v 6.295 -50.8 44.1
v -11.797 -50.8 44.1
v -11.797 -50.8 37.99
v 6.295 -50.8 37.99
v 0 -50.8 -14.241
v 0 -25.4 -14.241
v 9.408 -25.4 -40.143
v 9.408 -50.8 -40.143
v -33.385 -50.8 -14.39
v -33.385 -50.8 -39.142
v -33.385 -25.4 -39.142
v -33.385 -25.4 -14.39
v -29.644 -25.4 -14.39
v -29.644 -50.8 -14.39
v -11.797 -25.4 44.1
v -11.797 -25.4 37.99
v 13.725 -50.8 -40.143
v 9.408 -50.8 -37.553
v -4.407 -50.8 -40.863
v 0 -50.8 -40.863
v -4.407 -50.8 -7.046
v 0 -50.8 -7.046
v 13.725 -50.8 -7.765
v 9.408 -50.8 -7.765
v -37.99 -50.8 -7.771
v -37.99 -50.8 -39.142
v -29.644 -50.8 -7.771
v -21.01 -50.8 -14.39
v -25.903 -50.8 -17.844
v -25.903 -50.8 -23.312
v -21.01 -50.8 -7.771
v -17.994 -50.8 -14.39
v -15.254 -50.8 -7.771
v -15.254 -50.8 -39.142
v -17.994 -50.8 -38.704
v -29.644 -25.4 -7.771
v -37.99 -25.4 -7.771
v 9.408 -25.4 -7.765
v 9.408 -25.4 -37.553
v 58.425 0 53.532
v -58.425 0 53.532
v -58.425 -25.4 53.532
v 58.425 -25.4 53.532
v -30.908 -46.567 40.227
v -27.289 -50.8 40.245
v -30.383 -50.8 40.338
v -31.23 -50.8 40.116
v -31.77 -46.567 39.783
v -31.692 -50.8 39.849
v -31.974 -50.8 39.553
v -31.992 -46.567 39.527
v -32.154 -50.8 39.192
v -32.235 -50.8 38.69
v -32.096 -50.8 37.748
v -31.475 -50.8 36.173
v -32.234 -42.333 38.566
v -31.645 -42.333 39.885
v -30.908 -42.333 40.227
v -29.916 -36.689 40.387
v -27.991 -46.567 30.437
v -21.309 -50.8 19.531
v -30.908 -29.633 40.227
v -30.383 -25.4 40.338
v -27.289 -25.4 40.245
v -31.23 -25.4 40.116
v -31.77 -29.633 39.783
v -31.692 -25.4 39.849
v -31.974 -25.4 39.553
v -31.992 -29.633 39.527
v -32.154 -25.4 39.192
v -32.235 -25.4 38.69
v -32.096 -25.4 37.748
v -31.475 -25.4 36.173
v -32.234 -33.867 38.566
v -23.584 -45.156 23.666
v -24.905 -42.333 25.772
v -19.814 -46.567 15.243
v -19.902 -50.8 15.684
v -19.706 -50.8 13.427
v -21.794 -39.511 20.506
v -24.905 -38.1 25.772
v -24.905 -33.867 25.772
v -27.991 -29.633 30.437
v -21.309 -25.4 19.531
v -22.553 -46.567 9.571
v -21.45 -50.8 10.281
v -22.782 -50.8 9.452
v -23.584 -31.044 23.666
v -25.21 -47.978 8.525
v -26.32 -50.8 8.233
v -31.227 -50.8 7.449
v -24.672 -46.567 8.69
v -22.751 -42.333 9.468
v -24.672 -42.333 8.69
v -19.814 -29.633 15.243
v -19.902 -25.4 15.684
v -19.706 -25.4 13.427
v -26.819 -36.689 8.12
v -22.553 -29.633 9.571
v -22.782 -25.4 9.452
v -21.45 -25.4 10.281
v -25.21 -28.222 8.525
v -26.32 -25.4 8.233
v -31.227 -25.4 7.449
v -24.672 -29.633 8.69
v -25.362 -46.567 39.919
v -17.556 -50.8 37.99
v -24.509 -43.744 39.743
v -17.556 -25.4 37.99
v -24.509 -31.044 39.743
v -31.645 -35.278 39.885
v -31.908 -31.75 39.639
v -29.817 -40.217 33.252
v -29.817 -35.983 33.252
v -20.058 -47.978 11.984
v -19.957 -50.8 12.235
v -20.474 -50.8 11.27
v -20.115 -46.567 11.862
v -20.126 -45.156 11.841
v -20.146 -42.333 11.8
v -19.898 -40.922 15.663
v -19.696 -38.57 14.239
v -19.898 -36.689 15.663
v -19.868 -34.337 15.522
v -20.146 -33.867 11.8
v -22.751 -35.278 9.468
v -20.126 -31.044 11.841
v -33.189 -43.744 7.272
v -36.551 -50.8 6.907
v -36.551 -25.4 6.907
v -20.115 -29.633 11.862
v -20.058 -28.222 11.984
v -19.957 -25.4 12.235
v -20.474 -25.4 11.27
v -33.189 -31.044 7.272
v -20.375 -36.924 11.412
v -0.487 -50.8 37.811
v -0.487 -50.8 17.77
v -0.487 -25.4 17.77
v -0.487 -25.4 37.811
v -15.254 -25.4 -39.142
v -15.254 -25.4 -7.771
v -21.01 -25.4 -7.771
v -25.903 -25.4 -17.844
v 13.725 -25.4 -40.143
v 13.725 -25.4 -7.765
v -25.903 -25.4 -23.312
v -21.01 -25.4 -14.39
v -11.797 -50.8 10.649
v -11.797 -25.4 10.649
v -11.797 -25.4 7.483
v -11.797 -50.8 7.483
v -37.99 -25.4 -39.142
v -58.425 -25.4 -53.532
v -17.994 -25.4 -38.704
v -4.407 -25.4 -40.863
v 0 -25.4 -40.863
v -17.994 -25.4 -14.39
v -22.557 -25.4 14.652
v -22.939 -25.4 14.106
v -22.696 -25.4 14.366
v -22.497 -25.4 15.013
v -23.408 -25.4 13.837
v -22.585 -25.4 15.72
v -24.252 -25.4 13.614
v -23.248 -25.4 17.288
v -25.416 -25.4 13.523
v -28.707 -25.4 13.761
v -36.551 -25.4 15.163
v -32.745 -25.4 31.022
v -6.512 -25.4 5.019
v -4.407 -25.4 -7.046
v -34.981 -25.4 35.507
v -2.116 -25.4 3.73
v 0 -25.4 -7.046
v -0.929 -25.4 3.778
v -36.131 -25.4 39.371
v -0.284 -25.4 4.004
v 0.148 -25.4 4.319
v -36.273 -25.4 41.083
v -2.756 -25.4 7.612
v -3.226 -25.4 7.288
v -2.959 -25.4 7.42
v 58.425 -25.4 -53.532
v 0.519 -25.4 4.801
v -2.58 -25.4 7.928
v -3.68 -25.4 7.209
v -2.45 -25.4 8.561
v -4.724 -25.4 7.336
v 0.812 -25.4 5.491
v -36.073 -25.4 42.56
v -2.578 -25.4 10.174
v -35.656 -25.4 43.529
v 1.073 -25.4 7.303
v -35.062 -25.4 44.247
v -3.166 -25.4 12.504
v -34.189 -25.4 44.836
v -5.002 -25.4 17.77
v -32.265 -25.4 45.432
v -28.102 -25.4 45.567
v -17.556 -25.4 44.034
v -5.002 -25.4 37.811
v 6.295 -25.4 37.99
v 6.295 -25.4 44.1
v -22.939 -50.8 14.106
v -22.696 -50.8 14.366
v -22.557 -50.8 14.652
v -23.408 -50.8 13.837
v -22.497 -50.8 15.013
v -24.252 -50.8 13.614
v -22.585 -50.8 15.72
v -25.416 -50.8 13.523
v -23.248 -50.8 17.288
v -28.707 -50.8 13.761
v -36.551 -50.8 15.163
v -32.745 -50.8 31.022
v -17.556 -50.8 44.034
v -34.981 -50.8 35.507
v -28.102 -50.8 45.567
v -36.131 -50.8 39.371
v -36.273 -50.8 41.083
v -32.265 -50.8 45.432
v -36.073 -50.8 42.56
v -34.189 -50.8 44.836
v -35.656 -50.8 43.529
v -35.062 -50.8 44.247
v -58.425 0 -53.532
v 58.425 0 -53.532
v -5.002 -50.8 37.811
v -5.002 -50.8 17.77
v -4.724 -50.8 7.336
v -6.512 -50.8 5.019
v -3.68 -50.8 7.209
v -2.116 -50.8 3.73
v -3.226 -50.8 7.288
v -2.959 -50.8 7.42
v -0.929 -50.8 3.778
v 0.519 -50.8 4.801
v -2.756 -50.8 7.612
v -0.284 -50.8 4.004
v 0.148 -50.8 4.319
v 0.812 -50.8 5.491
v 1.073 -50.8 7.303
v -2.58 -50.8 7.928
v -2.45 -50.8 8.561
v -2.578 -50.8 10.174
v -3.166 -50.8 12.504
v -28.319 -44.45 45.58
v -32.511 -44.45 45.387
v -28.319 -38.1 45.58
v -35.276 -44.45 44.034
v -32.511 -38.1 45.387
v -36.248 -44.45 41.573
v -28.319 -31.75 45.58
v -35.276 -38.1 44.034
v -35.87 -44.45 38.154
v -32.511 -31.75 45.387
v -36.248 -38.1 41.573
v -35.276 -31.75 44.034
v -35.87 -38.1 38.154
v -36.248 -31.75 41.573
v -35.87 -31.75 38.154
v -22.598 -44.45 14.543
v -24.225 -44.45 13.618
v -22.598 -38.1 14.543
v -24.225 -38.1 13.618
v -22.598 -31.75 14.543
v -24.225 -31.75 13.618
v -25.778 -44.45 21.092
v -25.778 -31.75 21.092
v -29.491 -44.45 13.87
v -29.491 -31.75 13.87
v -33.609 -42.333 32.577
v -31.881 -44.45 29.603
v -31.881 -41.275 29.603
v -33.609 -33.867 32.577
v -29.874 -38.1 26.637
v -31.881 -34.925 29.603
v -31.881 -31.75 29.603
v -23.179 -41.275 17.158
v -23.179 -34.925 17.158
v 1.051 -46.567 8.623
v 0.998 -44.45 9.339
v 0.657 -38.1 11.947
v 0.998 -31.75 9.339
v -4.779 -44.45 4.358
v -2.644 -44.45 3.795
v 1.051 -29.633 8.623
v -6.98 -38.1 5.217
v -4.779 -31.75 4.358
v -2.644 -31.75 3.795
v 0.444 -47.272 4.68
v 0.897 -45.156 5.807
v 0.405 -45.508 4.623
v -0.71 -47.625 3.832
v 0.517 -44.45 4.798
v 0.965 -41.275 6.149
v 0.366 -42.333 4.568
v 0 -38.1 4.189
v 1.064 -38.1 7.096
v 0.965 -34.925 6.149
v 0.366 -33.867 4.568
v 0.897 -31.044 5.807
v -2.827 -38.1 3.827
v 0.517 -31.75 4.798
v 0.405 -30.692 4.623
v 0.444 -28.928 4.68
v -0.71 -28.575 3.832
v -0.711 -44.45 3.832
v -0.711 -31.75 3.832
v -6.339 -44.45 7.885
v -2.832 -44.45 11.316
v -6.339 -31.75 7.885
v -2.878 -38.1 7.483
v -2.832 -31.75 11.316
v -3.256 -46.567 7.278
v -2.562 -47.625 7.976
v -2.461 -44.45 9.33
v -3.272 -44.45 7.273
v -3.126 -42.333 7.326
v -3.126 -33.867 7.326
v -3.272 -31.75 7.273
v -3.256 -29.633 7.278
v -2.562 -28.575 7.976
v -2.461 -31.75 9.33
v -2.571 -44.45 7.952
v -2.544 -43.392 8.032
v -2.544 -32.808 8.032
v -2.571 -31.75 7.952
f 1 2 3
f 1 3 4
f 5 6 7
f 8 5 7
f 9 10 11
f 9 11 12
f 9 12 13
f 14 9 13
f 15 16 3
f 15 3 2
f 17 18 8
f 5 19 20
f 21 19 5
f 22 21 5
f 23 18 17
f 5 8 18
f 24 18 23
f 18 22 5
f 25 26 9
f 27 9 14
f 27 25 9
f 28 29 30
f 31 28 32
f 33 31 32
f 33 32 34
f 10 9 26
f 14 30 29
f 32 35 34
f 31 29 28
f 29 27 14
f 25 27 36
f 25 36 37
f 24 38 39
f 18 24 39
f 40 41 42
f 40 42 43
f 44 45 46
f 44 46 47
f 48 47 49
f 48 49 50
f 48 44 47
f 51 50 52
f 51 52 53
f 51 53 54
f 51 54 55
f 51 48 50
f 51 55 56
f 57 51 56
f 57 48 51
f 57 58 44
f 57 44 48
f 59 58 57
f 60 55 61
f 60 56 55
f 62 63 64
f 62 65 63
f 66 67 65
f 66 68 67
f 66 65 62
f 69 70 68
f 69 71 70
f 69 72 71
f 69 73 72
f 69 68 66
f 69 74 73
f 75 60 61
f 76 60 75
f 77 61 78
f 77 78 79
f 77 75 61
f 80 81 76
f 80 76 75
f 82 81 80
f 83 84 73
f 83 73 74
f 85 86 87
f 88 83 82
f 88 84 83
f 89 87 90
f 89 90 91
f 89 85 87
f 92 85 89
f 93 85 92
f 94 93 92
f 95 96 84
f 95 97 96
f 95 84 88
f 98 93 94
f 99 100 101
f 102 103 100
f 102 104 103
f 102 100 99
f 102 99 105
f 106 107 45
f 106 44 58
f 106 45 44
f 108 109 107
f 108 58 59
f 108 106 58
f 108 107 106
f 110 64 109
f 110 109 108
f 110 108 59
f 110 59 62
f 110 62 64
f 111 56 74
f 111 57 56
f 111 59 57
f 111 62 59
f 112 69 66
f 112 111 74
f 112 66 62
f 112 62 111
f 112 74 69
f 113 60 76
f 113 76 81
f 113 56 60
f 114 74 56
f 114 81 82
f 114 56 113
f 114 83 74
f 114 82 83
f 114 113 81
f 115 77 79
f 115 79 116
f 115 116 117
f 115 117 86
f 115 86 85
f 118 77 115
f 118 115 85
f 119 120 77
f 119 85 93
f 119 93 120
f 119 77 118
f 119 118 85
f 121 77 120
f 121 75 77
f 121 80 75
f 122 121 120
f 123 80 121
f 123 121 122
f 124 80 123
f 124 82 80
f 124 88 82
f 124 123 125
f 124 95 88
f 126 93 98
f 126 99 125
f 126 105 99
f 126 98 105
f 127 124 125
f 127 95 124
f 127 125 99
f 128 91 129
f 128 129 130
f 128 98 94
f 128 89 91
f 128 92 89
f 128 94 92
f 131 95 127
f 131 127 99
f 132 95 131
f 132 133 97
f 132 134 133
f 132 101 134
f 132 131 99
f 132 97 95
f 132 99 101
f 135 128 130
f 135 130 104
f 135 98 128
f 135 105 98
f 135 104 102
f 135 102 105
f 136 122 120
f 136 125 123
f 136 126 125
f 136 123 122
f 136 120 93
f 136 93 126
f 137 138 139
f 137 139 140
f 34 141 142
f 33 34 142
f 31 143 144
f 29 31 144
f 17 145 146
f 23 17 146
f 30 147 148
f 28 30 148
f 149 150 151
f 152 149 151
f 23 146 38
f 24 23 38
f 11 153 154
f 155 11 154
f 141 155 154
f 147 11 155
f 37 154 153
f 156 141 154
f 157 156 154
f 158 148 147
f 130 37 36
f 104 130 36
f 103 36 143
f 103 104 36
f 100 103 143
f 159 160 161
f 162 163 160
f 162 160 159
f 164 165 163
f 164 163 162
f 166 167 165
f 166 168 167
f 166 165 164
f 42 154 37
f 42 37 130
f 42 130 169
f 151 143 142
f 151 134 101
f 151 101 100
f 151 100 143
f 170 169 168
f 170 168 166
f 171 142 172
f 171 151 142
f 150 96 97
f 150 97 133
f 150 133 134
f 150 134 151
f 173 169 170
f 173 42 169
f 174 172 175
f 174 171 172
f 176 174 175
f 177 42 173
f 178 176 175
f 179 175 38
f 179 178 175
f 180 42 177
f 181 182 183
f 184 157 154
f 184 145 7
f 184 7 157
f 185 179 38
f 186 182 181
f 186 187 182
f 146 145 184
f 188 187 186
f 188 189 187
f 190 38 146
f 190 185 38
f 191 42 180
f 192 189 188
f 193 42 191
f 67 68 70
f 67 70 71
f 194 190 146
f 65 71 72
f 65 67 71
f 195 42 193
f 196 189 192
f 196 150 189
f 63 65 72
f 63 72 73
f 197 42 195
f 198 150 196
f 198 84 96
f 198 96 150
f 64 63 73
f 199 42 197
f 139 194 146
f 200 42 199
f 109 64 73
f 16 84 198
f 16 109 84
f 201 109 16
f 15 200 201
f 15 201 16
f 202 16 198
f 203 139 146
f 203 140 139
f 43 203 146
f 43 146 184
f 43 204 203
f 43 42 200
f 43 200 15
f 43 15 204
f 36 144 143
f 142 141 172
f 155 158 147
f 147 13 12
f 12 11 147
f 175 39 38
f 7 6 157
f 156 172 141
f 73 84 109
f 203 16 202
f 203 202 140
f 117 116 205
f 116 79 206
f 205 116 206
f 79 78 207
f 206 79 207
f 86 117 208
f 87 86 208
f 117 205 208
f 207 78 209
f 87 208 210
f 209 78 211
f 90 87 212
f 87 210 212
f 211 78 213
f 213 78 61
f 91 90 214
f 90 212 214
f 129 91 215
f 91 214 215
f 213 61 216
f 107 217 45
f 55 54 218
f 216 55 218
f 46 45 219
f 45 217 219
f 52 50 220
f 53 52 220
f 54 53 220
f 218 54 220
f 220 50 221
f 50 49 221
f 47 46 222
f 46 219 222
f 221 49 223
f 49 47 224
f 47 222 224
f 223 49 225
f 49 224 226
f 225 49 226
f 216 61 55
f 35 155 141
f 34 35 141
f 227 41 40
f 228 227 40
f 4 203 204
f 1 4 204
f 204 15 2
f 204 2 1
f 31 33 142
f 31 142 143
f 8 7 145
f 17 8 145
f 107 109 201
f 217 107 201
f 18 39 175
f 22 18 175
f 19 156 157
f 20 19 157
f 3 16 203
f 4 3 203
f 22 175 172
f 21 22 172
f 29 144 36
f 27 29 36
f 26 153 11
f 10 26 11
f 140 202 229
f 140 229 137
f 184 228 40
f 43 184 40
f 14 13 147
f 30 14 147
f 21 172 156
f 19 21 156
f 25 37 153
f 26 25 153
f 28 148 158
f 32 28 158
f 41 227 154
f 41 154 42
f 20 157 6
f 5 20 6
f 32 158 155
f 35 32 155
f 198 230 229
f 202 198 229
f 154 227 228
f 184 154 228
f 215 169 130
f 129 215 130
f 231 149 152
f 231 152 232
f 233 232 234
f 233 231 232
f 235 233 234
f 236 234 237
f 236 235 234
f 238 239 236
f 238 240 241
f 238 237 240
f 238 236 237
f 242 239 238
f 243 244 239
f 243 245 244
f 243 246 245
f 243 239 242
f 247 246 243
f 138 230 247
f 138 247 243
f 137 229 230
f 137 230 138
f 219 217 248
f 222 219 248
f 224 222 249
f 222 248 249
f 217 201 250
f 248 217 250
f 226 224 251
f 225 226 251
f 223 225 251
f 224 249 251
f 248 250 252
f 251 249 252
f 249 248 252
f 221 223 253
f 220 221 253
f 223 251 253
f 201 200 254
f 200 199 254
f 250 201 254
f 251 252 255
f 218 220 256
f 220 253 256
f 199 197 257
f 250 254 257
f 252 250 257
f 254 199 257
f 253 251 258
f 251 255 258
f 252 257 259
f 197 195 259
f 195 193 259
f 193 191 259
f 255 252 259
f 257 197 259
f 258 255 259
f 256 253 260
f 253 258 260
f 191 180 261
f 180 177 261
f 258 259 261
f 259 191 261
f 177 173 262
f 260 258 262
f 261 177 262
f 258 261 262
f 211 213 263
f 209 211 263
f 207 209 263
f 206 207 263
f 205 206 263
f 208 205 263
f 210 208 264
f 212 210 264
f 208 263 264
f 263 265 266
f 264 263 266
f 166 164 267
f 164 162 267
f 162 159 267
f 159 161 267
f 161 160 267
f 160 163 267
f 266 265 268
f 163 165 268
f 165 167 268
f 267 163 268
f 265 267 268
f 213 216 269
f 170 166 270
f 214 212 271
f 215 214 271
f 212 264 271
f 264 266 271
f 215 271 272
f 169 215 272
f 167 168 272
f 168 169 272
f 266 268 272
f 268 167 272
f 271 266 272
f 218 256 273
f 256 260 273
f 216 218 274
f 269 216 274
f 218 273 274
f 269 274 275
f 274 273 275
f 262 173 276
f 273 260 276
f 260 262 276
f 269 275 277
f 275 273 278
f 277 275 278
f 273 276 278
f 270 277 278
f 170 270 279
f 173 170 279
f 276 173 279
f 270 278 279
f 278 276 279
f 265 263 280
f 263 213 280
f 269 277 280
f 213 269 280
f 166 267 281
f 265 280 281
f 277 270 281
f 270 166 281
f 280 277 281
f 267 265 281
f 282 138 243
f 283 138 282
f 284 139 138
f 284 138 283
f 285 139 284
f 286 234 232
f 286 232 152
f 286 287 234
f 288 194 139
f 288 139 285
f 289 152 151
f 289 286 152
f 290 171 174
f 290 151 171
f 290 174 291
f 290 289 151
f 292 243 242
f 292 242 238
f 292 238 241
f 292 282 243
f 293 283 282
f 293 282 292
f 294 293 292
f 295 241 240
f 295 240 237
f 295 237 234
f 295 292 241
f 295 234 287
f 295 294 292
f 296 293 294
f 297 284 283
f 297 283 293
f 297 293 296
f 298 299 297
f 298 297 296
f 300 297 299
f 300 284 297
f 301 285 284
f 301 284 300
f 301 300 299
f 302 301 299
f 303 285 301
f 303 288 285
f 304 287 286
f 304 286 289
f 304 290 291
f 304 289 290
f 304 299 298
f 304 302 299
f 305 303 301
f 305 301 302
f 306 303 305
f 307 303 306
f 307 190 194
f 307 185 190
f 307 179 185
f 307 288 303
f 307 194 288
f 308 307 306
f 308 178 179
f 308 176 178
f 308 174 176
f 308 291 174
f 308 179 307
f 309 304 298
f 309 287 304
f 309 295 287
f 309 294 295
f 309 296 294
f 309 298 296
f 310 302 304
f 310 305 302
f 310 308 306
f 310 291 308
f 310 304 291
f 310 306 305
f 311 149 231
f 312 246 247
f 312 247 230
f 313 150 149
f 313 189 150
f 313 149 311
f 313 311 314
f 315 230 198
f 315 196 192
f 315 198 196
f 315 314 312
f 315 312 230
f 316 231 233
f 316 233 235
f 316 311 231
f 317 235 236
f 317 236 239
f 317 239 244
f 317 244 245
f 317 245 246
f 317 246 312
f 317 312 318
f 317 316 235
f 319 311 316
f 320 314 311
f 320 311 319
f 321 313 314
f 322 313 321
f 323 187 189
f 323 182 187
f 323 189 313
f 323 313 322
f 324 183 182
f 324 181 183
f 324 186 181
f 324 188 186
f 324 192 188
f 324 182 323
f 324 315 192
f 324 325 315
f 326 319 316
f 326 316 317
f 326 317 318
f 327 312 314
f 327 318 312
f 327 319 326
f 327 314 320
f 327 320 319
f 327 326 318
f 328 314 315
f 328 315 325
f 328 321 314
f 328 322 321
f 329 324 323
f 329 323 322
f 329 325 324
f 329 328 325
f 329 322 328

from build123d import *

# Parameters (mm, degrees)
F0_W     = 116.8491393328
F0_H     = 107.0637479424
F1_DEPTH = 25.4
F3_DEPTH = 25.4
F4_W     = 27.6406439953
F4_H     = 4.6218410134
F4_W_2   = 4.8651071265
F4_H_2   = 17.4579061568
F5_DEPTH = 25.4
F6_W     = 18.0926499888
F6_H     = 6.1099603772
F6_W_2   = 4.5143677853
F6_H_2   = 20.0416818261
F7_DEPTH = 25.4
F9_DEPTH = 25.4


with BuildPart() as f1:
    # F0 (on Front) → F1 (new body)
    with BuildSketch(Plane.XZ):
        Rectangle(F0_W, F0_H)
    extrude(amount=F1_DEPTH)

    # F2 (on face) → F3 (join)
    with BuildSketch(Plane.XZ.offset(25.4)):
        with BuildLine():
            add(Edge.make_bspline(
                [(-17.5561513752, 37.9903614521), (-24.953283017, 39.9782557098), (-42.8097815631, 44.7769848175), (-5.2901499603, 6.2827135922), (-35.8809845375, 7.4254009752), (-36.5513302386, 6.9073382765)],
                knots=[0, 0, 0, 0, 0.2732261888, 0.6595614733, 0.9545192624, 0.9545192624, 0.9545192624, 0.9545192624], degree=3))
            Line((-17.5561513752, 37.9903614521), (-17.5561513752, 44.0342836082))
            add(Edge.make_bspline(
                [(-17.5561513752, 44.0342836082), (-25.1543140232, 45.4079732221), (-39.6679355854, 48.0319248434), (-33.5640639258, 29.0982633355), (-16.0725558292, 11.0812579949), (-30.0093521692, 13.8591155064), (-36.5513302386, 15.1630509645)],
                knots=[0, 0, 0, 0, 0.2630540698, 0.502472426, 0.7664589194, 1, 1, 1, 1], degree=3))
            Line((-36.5513302386, 15.1630509645), (-36.5513302386, 6.9073382765))
        make_face()
    extrude(amount=F3_DEPTH)

    # F4 (on Front) → F5 (join)
    with BuildSketch(Plane.XZ):
        with Locations((2.0862433594, 40.473267436)):
            Rectangle(F4_W, F4_H)
        with BuildLine():
            add(Edge.make_bspline(
                [(2.4325535633, 20.6712316722), (3.4411130615, 16.0815352254), (5.5878055269, 6.3124865987), (-5.9730380011, 6.1934700271), (-12.1023636311, 6.1303698458)],
                knots=[0, 0, 0, 0, 0.4698202069, 1, 1, 1, 1], degree=3))
            Line((2.4325535633, 20.6712316722), (-2.4325535633, 20.6712316722))
            add(Edge.make_bspline(
                [(-12.1023636311, 12.2731719166), (-8.5431457012, 11.5565891098), (-1.4804466234, 10.1346450682), (-2.1168587101, 17.1775630293), (-2.4325535633, 20.6712316722)],
                knots=[0, 0, 0, 0, 0.5039458557, 1, 1, 1, 1], degree=3))
            Line((-12.1023636311, 12.2731719166), (-12.1023636311, 6.1303698458))
        make_face()
        with Locations((0, 29.4001847506)):
            Rectangle(F4_W_2, F4_H_2)
    extrude(amount=F5_DEPTH)

    # F6 (on face) → F7 (join)
    with BuildSketch(Plane.XZ.offset(25.4)):
        with Locations((-2.7509038337, 41.0453416407)):
            Rectangle(F6_W, F6_H)
        with Locations((-2.7444071602, 27.790505439)):
            Rectangle(F6_W_2, F6_H_2)
        with BuildLine():
            Line((-0.4872232676, 17.769664526), (-5.0015910529, 17.769664526))
            add(Edge.make_bspline(
                [(-11.7972288281, 10.6488130987), (-7.936658053, 8.5440484941), (-0.0090792572, 4.2219706922), (-3.3087786344, 13.1760440597), (-5.0015910529, 17.769664526)],
                knots=[0, 0, 0, 0, 0.4869798049, 1, 1, 1, 1], degree=3))
            Line((-11.7972288281, 10.6488130987), (-11.7972288281, 7.4829496443))
            add(Edge.make_bspline(
                [(-0.4872232676, 17.769664526), (0.7792555131, 11.7849451432), (3.2481003716, 0.1184696339), (-6.8697011613, 5.0709931812), (-11.7972288281, 7.4829496443)],
                knots=[0, 0, 0, 0, 0.5129843523, 1, 1, 1, 1], degree=3))
        make_face()
    extrude(amount=F7_DEPTH)

    # F8 (on face) → F9 (join)
    with BuildSketch(Plane.XZ.offset(25.4)):
        Polygon((-29.6439938247, -7.7707557939), (-37.9903614521, -7.7707557939), (-37.9903614521, -39.1415841877), (-33.3854667842, -39.1415841877), (-33.3854667842, -14.3902888522), (-29.6439938247, -14.3902888522), (-25.9025190026, -23.312266916), (-21.0098195821, -14.3902888522), (-17.9941952229, -14.3902888522), (-17.9941952229, -38.7041904032), (-15.2537059039, -39.1415841877), (-15.2537059039, -7.7707557939), (-21.0098195821, -7.7707557939), (-25.9025190026, -17.8439561278), align=None)
        Polygon((0, -14.2407007515), (0, -7.0455572568), (-4.40659374, -7.0455572568), (-4.40659374, -40.8627316356), (0, -40.8627316356), align=None)
        Polygon((9.408085607, -37.5529676676), (0, -7.0455572568), (0, -14.2407007515), (9.408085607, -40.1432216167), align=None)
        Polygon((9.408085607, -7.7650714666), (9.408085607, -37.5529676676), (9.408085607, -40.1432216167), (13.7251708657, -40.1432216167), (13.7251708657, -7.7650714666), align=None)
    extrude(amount=F9_DEPTH)


solid = f1.part
